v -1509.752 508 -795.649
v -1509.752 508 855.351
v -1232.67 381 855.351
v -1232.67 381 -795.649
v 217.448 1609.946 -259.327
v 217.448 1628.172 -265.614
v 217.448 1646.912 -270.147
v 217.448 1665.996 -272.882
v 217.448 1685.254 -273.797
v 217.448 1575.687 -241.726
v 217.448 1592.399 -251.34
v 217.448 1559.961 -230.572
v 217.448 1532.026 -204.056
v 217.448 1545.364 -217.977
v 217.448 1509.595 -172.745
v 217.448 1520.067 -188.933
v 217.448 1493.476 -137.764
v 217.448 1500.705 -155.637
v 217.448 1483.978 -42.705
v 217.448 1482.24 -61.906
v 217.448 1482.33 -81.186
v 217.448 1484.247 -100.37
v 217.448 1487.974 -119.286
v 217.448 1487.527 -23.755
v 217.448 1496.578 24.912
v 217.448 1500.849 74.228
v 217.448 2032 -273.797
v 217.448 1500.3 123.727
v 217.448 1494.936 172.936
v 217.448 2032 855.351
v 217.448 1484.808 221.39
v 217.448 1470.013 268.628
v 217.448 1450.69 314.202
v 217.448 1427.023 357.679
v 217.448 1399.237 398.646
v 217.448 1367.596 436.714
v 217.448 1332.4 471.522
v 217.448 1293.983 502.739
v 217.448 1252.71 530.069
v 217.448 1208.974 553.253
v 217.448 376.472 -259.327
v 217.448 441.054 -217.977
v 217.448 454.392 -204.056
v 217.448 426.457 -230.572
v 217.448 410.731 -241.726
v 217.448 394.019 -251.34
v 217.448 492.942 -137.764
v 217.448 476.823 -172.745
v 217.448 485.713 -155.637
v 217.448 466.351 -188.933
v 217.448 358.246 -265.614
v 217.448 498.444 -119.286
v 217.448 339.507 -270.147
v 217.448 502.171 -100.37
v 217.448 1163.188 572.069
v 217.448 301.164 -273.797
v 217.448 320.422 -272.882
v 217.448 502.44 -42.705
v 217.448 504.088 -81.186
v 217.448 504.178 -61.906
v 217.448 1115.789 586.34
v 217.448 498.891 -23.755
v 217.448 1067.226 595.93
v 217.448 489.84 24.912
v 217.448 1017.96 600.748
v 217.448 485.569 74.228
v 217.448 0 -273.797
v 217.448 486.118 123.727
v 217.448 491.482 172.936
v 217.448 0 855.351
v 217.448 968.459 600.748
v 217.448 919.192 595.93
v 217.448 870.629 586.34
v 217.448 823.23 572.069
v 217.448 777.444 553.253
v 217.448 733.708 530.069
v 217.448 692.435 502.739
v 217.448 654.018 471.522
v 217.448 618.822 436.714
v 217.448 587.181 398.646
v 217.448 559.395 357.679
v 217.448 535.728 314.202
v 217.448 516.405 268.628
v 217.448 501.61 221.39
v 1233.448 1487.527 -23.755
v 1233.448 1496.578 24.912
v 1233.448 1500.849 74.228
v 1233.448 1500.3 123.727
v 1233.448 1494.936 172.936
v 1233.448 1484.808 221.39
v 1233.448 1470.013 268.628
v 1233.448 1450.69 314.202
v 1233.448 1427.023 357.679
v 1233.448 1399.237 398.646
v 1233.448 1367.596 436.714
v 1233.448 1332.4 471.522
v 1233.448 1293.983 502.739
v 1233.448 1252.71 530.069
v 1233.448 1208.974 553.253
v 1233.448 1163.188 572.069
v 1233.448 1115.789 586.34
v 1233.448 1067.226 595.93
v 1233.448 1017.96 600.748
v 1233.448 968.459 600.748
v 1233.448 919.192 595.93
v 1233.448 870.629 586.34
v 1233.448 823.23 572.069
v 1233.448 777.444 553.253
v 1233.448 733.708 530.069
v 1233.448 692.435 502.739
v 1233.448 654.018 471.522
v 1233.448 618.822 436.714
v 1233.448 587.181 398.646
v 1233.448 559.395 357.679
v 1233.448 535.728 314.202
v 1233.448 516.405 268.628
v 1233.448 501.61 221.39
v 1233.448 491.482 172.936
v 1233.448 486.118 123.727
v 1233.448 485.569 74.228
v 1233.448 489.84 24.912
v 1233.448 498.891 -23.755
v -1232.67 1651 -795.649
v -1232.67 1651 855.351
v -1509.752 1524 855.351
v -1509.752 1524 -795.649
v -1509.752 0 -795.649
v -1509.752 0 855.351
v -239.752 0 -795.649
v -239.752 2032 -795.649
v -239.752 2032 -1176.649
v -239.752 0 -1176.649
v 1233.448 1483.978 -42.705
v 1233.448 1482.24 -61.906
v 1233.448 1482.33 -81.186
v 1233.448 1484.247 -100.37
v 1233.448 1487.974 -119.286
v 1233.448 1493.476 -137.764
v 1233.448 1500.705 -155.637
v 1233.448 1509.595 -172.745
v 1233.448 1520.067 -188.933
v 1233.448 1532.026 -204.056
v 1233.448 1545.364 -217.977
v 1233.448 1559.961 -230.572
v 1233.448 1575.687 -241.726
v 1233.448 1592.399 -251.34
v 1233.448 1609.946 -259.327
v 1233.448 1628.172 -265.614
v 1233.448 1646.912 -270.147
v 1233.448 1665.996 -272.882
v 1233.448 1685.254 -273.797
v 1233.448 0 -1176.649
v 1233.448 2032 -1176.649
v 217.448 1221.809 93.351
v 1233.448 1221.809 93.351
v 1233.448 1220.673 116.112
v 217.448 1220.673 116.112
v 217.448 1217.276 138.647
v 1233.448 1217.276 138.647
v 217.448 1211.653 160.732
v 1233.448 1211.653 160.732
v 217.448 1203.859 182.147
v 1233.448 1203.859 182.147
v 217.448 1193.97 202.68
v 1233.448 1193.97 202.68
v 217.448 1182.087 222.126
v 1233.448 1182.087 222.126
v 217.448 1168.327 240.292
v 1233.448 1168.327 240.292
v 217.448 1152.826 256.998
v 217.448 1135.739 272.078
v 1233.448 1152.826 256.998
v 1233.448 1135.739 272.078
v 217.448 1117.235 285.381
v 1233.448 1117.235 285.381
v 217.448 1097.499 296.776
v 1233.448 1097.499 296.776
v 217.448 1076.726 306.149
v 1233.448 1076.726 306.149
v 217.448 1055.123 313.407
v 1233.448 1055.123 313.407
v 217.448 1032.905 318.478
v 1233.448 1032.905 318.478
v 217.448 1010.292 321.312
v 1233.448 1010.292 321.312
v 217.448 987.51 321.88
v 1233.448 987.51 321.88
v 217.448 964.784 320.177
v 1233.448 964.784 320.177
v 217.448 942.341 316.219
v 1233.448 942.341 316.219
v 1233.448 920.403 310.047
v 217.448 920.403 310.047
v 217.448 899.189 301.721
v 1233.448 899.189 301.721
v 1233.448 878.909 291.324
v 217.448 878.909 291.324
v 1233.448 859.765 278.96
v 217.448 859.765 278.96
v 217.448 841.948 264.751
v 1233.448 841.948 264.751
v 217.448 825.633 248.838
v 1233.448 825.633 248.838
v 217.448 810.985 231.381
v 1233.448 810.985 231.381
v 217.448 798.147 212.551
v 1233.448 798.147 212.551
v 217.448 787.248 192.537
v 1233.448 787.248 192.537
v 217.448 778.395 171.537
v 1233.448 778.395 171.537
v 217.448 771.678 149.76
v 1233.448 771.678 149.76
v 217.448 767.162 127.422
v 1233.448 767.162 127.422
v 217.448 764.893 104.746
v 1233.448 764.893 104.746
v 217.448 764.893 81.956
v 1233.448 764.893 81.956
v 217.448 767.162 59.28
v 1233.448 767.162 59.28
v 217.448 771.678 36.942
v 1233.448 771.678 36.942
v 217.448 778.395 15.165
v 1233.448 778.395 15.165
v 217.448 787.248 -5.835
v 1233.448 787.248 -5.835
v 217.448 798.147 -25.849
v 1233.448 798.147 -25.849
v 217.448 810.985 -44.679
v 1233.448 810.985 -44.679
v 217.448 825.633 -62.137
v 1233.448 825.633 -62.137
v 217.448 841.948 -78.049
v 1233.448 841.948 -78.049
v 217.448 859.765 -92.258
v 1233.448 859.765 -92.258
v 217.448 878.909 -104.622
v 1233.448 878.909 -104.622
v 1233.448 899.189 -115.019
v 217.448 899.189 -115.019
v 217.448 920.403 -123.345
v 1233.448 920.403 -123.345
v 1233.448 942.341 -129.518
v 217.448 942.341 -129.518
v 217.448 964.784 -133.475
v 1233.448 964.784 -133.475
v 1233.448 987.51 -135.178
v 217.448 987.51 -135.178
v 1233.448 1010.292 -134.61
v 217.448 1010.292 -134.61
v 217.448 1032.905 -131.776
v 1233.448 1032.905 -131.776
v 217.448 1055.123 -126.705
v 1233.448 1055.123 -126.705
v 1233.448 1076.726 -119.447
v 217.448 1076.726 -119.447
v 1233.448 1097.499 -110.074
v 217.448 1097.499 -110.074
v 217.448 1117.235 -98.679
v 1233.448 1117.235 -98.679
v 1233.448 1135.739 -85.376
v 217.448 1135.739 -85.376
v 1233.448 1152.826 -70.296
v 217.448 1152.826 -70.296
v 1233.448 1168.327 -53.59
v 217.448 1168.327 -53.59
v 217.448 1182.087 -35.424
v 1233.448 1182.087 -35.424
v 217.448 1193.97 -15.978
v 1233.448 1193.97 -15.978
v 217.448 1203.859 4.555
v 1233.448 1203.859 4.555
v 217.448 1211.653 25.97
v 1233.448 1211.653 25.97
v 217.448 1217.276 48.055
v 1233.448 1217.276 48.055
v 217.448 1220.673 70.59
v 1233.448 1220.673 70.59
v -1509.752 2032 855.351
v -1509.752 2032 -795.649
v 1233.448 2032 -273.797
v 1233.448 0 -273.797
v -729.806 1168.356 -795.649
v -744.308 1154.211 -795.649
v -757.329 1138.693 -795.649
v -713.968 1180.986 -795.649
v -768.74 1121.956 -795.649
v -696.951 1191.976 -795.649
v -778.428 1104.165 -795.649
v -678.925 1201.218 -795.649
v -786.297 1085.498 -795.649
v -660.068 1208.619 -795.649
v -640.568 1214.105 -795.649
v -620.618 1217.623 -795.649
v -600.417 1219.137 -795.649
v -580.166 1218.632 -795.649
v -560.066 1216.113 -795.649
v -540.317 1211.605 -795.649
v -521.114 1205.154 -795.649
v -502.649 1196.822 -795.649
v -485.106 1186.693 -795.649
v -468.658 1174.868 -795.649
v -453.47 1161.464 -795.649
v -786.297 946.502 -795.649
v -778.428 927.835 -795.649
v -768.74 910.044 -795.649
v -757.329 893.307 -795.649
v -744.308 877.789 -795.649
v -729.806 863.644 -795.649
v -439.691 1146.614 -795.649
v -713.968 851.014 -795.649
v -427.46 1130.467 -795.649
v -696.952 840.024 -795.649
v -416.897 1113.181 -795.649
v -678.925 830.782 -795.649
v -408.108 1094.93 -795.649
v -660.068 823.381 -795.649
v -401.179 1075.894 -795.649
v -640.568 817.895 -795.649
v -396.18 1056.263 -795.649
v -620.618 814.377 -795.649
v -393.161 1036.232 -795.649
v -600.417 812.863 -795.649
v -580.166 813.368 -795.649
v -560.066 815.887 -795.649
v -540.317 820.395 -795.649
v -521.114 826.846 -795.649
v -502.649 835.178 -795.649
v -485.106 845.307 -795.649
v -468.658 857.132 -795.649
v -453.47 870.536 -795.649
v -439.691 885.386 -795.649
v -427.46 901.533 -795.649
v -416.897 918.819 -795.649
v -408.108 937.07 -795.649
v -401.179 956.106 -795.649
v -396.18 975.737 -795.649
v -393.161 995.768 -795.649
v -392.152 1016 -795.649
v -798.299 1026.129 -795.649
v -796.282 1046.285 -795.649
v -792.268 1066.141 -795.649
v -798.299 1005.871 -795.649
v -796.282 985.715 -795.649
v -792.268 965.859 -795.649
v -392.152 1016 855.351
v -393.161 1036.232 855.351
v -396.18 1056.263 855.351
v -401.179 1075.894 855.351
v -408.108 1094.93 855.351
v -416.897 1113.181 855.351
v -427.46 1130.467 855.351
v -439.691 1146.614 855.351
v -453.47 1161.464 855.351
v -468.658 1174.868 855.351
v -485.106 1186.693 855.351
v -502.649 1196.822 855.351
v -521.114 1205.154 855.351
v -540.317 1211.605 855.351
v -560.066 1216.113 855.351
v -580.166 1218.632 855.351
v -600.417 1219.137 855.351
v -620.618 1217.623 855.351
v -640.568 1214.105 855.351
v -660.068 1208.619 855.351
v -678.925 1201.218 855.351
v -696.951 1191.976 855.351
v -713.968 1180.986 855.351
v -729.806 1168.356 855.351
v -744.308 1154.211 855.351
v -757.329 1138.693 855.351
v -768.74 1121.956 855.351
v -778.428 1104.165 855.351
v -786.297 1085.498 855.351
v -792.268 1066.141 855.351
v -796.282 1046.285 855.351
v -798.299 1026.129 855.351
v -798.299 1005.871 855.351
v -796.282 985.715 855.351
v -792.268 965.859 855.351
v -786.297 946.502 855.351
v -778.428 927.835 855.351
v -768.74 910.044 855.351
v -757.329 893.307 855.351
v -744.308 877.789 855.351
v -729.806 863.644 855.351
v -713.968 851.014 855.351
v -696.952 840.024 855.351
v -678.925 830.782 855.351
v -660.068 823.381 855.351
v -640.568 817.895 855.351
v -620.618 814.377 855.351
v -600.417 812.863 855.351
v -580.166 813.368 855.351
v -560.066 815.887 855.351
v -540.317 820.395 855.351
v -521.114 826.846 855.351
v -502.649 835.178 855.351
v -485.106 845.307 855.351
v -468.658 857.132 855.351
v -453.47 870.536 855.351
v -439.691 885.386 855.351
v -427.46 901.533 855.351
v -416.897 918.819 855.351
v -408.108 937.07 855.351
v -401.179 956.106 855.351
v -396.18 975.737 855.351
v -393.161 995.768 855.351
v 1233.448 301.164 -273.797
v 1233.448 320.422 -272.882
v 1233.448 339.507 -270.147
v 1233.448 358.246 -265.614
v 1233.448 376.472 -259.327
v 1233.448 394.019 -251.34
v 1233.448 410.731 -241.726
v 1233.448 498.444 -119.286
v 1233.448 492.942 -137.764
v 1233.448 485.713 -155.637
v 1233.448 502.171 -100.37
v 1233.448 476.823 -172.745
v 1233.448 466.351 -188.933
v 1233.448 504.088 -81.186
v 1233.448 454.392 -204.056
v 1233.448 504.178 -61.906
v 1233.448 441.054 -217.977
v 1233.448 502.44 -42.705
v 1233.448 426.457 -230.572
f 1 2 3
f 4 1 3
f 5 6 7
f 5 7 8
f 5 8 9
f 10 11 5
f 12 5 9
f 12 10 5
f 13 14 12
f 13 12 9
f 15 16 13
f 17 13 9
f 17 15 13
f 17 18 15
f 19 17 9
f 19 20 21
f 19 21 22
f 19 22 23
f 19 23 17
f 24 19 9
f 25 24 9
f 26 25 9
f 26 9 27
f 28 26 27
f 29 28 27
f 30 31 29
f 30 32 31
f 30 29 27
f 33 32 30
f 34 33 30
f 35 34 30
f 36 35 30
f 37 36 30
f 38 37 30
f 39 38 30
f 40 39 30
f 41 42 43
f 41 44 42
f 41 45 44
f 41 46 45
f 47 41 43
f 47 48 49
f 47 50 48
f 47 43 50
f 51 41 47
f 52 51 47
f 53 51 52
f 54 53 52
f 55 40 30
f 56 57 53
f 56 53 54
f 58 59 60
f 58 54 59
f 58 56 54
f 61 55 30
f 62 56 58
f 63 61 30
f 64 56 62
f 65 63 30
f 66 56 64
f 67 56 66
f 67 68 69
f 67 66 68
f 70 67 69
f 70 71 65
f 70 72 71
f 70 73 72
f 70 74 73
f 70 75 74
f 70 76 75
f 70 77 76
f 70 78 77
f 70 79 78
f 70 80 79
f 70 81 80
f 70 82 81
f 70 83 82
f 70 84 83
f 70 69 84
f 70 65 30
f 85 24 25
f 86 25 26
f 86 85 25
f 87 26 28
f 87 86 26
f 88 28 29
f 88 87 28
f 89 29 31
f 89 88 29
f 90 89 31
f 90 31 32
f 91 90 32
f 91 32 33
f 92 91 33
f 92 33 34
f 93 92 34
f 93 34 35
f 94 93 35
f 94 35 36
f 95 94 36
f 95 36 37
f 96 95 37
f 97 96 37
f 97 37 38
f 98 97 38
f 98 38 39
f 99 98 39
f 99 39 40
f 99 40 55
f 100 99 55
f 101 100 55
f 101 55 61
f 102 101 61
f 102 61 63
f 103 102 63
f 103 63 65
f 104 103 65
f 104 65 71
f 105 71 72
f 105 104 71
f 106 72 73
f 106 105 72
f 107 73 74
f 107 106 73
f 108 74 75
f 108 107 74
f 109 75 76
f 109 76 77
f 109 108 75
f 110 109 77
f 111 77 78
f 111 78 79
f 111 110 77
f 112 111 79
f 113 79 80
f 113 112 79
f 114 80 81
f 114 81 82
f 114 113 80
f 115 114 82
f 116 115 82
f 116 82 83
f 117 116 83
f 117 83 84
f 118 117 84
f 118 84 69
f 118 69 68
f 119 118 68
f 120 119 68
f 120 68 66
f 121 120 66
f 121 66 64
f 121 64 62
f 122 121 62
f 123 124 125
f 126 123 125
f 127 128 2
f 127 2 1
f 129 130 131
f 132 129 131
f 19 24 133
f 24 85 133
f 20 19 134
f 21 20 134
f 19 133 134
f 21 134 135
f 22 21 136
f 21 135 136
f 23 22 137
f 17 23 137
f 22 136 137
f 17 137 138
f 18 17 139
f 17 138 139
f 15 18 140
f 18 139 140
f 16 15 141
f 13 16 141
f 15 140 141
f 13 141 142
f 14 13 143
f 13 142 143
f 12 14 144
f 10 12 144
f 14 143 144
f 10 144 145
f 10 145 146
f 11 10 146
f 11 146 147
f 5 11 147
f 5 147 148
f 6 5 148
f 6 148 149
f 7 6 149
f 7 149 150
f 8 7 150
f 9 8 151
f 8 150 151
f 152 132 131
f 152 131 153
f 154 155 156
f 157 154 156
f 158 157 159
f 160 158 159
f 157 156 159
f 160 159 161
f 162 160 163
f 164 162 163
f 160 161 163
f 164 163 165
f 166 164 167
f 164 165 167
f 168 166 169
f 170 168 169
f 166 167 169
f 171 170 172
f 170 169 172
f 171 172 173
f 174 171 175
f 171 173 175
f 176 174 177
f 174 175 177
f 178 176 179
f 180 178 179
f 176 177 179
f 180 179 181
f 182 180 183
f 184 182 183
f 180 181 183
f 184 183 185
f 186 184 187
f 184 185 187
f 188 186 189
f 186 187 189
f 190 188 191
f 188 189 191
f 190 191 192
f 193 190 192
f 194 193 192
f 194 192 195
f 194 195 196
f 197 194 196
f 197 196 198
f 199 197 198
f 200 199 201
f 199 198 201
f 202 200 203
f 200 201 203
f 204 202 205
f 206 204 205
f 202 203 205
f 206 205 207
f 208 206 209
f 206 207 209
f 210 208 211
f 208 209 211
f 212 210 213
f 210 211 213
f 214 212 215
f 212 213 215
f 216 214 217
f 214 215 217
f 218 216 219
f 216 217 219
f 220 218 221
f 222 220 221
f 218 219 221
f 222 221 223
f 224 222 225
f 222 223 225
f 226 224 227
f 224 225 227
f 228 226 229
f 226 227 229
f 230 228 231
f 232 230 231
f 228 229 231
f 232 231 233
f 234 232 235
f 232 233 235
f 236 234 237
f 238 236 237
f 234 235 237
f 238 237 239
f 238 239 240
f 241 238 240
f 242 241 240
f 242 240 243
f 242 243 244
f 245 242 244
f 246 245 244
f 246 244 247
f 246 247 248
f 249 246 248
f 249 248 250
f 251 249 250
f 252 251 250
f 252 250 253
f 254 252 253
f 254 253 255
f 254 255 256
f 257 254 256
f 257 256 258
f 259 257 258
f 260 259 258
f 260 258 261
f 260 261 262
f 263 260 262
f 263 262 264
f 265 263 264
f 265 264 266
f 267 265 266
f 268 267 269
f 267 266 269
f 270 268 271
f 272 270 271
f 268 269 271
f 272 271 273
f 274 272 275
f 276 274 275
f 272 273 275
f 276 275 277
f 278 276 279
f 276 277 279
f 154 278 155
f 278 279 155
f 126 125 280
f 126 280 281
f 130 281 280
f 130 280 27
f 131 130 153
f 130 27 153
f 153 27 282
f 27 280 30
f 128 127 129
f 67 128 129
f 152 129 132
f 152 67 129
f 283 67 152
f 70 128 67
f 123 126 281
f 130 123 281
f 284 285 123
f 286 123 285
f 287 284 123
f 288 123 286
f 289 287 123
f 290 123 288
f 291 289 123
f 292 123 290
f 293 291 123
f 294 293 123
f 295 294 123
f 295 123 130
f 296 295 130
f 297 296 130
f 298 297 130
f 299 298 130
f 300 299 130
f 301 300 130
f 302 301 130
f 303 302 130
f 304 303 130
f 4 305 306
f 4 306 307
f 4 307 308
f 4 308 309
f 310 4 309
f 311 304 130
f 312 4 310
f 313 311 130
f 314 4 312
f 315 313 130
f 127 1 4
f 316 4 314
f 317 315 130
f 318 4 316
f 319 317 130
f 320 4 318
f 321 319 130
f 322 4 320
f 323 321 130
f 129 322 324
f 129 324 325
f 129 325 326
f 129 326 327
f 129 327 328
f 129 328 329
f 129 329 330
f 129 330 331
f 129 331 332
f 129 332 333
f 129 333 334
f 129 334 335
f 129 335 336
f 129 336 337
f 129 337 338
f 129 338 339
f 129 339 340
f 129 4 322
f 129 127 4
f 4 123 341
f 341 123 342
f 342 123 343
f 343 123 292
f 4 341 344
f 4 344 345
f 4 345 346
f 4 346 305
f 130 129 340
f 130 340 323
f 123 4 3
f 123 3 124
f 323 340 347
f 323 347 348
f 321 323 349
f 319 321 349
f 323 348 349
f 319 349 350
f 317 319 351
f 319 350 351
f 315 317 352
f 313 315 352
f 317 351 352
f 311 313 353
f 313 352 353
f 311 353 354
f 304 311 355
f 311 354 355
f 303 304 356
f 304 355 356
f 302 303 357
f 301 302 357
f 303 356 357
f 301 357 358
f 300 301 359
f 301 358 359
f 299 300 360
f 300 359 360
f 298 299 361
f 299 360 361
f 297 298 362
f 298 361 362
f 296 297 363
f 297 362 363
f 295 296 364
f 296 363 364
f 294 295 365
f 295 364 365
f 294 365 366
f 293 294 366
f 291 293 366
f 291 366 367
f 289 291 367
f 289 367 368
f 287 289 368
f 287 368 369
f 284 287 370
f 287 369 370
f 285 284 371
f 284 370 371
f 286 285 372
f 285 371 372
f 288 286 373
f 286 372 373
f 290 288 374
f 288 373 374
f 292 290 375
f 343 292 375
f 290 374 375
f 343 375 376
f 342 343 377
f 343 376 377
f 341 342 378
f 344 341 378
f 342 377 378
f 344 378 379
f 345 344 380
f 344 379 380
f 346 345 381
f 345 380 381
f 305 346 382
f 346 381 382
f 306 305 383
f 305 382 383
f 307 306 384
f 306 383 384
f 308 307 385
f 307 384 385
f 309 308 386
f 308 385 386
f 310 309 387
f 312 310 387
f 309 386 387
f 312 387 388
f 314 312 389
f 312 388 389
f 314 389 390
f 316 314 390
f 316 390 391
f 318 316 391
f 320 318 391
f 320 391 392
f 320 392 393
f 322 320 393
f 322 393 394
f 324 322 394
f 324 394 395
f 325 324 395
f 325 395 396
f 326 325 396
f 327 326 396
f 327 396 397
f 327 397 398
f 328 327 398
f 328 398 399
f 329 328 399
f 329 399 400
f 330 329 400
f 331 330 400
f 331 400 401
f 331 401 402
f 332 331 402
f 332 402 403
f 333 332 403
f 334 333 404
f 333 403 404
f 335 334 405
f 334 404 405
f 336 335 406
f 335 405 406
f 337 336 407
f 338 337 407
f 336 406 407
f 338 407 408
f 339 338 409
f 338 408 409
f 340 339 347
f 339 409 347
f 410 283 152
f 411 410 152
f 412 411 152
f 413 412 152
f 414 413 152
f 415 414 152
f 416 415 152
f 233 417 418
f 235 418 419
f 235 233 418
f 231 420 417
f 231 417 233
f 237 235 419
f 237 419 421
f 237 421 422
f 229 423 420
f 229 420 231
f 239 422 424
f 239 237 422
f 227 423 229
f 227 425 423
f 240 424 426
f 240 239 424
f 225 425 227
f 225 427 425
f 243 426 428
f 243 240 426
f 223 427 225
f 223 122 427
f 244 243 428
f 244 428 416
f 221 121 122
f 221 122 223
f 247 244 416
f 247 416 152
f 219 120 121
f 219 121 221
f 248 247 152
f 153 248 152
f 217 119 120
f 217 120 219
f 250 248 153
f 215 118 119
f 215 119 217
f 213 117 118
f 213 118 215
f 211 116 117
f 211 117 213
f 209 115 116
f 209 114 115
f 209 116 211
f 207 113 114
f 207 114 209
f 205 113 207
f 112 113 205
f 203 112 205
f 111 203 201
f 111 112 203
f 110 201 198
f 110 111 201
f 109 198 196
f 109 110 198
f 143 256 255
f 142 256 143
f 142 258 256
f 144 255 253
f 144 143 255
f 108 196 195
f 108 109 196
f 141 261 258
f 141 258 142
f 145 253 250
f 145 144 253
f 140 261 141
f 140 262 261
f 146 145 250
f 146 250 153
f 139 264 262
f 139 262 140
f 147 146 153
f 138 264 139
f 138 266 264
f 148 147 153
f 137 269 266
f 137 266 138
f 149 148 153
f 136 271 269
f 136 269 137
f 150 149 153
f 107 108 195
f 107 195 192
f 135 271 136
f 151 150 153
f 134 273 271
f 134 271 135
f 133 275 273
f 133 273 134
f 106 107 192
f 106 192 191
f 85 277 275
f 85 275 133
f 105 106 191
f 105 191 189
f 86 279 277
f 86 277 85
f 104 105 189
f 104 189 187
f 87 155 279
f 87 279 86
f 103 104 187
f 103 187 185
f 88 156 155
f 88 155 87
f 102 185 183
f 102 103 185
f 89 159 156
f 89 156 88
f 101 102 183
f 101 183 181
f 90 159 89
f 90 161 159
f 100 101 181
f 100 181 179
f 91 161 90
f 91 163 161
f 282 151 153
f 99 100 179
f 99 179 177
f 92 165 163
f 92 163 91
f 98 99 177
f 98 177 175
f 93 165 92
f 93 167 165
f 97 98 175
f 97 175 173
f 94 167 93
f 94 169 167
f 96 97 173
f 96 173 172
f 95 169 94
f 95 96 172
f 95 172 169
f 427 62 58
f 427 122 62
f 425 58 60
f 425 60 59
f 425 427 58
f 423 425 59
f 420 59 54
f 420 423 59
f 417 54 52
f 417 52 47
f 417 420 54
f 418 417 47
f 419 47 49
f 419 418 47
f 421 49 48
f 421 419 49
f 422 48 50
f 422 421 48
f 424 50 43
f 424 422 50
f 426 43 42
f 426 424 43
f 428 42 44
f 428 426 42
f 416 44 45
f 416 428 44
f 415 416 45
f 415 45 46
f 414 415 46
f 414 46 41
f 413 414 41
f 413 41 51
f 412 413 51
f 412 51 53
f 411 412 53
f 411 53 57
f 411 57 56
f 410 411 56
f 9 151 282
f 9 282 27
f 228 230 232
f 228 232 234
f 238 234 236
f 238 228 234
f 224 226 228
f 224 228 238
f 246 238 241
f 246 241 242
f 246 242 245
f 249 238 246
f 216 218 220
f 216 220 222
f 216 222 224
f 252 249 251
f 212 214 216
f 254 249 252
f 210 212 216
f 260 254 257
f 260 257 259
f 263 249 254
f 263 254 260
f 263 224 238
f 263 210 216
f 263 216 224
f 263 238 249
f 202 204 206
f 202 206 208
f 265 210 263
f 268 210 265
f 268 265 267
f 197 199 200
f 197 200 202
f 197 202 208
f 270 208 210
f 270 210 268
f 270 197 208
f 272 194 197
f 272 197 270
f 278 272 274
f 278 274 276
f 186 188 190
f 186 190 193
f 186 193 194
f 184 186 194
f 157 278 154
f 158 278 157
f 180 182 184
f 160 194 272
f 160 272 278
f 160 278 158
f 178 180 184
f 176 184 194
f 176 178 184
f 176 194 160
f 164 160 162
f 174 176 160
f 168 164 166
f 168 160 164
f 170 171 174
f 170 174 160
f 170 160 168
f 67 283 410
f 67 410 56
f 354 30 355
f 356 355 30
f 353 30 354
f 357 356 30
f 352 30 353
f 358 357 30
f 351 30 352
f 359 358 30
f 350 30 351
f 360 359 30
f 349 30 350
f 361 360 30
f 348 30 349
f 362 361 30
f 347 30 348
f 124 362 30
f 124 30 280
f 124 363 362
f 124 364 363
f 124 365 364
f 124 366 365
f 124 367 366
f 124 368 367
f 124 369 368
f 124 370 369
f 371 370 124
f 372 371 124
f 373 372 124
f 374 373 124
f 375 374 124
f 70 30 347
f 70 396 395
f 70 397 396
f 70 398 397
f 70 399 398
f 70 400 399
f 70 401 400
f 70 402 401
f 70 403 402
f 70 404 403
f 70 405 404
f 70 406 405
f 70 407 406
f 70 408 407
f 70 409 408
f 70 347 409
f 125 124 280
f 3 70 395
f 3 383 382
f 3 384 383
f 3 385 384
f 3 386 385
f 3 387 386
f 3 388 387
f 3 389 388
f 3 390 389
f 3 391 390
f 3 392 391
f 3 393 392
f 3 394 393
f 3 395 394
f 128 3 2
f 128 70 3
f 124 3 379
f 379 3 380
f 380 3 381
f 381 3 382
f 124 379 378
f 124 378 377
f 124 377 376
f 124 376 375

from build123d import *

# Parameters (mm, degrees)
F1_DEPTH  = 2032
F3_DEPTH  = 1651
F4_R      = 203.2
F5_DEPTH  = 1651
F7_DEPTH  = 1016
F8_R      = 203.2
F9_R      = 203.2
F10_R     = 228.6
F11_DEPTH = 1016
F12_R     = 228.6
F13_DEPTH = 1016


with BuildPart() as f1:
    # F0 (on Front) → F1 (new body)
    with BuildSketch(Plane.XZ):
        Polygon((-239.7515, -1176.64908), (1233.4485, -1176.64908), (1233.4485, -273.796841), (217.4485, -273.796841), (217.4485, 855.35092), (-1509.7515, 855.35092), (-1509.7515, -795.64908), (-239.7515, -795.64908), align=None)
    extrude(amount=-F1_DEPTH)

    # F2 (on face) → F3 (cut)
    with BuildSketch(Plane.XY.offset(855.35092)):
        Polygon((-1232.670212, 381), (-1232.670212, 1651), (-1509.7515, 1524), (-1509.7515, 2032), (-2309.389114, 1178.267121), (-2251.436472, 691.465914), (-1509.7515, 0), (-1509.7515, 508), align=None)
    extrude(amount=-F3_DEPTH, mode=Mode.SUBTRACT)

    # F4 (on face) → F5 (cut)
    with BuildSketch(Plane.XY.offset(855.35092)):
        with Locations((-595.3515, 1016)):
            Circle(F4_R)
    extrude(amount=-F5_DEPTH, mode=Mode.SUBTRACT)

    # F6 (on face) → F7 (join)
    with BuildSketch(Plane.YZ.offset(1233.4485)):
        with BuildLine():
            ThreePointArc((485.209048, 93.35092), (993.209048, -414.64908), (1501.209048, 93.35092))
            ThreePointArc((1501.209048, 93.35092), (993.209048, 601.35092), (485.209048, 93.35092))
        make_face()
    extrude(amount=-F7_DEPTH)

    # F8
    f8_edges = [f1.edges().sort_by_distance(p)[0] for p in [
        (725.4485, 1344.302372, -273.796841),
    ]]
    fillet(f8_edges, radius=F8_R)

    # F9
    f9_edges = [f1.edges().sort_by_distance(p)[0] for p in [
        (725.4485, 642.115724, -273.796841),
    ]]
    fillet(f9_edges, radius=F9_R)

    # F10 (on face) → F11 (join)
    with BuildSketch(Plane.YZ.offset(1233.4485)):
        with Locations((993.209048, 93.35092)):
            Circle(F10_R)
    extrude(amount=-F11_DEPTH)

    # F12 (on face) → F13 (cut)
    with BuildSketch(Plane.YZ.offset(1233.4485)):
        with Locations((993.209048, 93.35092)):
            Circle(F12_R)
    extrude(amount=-F13_DEPTH, mode=Mode.SUBTRACT)


solid = f1.part
